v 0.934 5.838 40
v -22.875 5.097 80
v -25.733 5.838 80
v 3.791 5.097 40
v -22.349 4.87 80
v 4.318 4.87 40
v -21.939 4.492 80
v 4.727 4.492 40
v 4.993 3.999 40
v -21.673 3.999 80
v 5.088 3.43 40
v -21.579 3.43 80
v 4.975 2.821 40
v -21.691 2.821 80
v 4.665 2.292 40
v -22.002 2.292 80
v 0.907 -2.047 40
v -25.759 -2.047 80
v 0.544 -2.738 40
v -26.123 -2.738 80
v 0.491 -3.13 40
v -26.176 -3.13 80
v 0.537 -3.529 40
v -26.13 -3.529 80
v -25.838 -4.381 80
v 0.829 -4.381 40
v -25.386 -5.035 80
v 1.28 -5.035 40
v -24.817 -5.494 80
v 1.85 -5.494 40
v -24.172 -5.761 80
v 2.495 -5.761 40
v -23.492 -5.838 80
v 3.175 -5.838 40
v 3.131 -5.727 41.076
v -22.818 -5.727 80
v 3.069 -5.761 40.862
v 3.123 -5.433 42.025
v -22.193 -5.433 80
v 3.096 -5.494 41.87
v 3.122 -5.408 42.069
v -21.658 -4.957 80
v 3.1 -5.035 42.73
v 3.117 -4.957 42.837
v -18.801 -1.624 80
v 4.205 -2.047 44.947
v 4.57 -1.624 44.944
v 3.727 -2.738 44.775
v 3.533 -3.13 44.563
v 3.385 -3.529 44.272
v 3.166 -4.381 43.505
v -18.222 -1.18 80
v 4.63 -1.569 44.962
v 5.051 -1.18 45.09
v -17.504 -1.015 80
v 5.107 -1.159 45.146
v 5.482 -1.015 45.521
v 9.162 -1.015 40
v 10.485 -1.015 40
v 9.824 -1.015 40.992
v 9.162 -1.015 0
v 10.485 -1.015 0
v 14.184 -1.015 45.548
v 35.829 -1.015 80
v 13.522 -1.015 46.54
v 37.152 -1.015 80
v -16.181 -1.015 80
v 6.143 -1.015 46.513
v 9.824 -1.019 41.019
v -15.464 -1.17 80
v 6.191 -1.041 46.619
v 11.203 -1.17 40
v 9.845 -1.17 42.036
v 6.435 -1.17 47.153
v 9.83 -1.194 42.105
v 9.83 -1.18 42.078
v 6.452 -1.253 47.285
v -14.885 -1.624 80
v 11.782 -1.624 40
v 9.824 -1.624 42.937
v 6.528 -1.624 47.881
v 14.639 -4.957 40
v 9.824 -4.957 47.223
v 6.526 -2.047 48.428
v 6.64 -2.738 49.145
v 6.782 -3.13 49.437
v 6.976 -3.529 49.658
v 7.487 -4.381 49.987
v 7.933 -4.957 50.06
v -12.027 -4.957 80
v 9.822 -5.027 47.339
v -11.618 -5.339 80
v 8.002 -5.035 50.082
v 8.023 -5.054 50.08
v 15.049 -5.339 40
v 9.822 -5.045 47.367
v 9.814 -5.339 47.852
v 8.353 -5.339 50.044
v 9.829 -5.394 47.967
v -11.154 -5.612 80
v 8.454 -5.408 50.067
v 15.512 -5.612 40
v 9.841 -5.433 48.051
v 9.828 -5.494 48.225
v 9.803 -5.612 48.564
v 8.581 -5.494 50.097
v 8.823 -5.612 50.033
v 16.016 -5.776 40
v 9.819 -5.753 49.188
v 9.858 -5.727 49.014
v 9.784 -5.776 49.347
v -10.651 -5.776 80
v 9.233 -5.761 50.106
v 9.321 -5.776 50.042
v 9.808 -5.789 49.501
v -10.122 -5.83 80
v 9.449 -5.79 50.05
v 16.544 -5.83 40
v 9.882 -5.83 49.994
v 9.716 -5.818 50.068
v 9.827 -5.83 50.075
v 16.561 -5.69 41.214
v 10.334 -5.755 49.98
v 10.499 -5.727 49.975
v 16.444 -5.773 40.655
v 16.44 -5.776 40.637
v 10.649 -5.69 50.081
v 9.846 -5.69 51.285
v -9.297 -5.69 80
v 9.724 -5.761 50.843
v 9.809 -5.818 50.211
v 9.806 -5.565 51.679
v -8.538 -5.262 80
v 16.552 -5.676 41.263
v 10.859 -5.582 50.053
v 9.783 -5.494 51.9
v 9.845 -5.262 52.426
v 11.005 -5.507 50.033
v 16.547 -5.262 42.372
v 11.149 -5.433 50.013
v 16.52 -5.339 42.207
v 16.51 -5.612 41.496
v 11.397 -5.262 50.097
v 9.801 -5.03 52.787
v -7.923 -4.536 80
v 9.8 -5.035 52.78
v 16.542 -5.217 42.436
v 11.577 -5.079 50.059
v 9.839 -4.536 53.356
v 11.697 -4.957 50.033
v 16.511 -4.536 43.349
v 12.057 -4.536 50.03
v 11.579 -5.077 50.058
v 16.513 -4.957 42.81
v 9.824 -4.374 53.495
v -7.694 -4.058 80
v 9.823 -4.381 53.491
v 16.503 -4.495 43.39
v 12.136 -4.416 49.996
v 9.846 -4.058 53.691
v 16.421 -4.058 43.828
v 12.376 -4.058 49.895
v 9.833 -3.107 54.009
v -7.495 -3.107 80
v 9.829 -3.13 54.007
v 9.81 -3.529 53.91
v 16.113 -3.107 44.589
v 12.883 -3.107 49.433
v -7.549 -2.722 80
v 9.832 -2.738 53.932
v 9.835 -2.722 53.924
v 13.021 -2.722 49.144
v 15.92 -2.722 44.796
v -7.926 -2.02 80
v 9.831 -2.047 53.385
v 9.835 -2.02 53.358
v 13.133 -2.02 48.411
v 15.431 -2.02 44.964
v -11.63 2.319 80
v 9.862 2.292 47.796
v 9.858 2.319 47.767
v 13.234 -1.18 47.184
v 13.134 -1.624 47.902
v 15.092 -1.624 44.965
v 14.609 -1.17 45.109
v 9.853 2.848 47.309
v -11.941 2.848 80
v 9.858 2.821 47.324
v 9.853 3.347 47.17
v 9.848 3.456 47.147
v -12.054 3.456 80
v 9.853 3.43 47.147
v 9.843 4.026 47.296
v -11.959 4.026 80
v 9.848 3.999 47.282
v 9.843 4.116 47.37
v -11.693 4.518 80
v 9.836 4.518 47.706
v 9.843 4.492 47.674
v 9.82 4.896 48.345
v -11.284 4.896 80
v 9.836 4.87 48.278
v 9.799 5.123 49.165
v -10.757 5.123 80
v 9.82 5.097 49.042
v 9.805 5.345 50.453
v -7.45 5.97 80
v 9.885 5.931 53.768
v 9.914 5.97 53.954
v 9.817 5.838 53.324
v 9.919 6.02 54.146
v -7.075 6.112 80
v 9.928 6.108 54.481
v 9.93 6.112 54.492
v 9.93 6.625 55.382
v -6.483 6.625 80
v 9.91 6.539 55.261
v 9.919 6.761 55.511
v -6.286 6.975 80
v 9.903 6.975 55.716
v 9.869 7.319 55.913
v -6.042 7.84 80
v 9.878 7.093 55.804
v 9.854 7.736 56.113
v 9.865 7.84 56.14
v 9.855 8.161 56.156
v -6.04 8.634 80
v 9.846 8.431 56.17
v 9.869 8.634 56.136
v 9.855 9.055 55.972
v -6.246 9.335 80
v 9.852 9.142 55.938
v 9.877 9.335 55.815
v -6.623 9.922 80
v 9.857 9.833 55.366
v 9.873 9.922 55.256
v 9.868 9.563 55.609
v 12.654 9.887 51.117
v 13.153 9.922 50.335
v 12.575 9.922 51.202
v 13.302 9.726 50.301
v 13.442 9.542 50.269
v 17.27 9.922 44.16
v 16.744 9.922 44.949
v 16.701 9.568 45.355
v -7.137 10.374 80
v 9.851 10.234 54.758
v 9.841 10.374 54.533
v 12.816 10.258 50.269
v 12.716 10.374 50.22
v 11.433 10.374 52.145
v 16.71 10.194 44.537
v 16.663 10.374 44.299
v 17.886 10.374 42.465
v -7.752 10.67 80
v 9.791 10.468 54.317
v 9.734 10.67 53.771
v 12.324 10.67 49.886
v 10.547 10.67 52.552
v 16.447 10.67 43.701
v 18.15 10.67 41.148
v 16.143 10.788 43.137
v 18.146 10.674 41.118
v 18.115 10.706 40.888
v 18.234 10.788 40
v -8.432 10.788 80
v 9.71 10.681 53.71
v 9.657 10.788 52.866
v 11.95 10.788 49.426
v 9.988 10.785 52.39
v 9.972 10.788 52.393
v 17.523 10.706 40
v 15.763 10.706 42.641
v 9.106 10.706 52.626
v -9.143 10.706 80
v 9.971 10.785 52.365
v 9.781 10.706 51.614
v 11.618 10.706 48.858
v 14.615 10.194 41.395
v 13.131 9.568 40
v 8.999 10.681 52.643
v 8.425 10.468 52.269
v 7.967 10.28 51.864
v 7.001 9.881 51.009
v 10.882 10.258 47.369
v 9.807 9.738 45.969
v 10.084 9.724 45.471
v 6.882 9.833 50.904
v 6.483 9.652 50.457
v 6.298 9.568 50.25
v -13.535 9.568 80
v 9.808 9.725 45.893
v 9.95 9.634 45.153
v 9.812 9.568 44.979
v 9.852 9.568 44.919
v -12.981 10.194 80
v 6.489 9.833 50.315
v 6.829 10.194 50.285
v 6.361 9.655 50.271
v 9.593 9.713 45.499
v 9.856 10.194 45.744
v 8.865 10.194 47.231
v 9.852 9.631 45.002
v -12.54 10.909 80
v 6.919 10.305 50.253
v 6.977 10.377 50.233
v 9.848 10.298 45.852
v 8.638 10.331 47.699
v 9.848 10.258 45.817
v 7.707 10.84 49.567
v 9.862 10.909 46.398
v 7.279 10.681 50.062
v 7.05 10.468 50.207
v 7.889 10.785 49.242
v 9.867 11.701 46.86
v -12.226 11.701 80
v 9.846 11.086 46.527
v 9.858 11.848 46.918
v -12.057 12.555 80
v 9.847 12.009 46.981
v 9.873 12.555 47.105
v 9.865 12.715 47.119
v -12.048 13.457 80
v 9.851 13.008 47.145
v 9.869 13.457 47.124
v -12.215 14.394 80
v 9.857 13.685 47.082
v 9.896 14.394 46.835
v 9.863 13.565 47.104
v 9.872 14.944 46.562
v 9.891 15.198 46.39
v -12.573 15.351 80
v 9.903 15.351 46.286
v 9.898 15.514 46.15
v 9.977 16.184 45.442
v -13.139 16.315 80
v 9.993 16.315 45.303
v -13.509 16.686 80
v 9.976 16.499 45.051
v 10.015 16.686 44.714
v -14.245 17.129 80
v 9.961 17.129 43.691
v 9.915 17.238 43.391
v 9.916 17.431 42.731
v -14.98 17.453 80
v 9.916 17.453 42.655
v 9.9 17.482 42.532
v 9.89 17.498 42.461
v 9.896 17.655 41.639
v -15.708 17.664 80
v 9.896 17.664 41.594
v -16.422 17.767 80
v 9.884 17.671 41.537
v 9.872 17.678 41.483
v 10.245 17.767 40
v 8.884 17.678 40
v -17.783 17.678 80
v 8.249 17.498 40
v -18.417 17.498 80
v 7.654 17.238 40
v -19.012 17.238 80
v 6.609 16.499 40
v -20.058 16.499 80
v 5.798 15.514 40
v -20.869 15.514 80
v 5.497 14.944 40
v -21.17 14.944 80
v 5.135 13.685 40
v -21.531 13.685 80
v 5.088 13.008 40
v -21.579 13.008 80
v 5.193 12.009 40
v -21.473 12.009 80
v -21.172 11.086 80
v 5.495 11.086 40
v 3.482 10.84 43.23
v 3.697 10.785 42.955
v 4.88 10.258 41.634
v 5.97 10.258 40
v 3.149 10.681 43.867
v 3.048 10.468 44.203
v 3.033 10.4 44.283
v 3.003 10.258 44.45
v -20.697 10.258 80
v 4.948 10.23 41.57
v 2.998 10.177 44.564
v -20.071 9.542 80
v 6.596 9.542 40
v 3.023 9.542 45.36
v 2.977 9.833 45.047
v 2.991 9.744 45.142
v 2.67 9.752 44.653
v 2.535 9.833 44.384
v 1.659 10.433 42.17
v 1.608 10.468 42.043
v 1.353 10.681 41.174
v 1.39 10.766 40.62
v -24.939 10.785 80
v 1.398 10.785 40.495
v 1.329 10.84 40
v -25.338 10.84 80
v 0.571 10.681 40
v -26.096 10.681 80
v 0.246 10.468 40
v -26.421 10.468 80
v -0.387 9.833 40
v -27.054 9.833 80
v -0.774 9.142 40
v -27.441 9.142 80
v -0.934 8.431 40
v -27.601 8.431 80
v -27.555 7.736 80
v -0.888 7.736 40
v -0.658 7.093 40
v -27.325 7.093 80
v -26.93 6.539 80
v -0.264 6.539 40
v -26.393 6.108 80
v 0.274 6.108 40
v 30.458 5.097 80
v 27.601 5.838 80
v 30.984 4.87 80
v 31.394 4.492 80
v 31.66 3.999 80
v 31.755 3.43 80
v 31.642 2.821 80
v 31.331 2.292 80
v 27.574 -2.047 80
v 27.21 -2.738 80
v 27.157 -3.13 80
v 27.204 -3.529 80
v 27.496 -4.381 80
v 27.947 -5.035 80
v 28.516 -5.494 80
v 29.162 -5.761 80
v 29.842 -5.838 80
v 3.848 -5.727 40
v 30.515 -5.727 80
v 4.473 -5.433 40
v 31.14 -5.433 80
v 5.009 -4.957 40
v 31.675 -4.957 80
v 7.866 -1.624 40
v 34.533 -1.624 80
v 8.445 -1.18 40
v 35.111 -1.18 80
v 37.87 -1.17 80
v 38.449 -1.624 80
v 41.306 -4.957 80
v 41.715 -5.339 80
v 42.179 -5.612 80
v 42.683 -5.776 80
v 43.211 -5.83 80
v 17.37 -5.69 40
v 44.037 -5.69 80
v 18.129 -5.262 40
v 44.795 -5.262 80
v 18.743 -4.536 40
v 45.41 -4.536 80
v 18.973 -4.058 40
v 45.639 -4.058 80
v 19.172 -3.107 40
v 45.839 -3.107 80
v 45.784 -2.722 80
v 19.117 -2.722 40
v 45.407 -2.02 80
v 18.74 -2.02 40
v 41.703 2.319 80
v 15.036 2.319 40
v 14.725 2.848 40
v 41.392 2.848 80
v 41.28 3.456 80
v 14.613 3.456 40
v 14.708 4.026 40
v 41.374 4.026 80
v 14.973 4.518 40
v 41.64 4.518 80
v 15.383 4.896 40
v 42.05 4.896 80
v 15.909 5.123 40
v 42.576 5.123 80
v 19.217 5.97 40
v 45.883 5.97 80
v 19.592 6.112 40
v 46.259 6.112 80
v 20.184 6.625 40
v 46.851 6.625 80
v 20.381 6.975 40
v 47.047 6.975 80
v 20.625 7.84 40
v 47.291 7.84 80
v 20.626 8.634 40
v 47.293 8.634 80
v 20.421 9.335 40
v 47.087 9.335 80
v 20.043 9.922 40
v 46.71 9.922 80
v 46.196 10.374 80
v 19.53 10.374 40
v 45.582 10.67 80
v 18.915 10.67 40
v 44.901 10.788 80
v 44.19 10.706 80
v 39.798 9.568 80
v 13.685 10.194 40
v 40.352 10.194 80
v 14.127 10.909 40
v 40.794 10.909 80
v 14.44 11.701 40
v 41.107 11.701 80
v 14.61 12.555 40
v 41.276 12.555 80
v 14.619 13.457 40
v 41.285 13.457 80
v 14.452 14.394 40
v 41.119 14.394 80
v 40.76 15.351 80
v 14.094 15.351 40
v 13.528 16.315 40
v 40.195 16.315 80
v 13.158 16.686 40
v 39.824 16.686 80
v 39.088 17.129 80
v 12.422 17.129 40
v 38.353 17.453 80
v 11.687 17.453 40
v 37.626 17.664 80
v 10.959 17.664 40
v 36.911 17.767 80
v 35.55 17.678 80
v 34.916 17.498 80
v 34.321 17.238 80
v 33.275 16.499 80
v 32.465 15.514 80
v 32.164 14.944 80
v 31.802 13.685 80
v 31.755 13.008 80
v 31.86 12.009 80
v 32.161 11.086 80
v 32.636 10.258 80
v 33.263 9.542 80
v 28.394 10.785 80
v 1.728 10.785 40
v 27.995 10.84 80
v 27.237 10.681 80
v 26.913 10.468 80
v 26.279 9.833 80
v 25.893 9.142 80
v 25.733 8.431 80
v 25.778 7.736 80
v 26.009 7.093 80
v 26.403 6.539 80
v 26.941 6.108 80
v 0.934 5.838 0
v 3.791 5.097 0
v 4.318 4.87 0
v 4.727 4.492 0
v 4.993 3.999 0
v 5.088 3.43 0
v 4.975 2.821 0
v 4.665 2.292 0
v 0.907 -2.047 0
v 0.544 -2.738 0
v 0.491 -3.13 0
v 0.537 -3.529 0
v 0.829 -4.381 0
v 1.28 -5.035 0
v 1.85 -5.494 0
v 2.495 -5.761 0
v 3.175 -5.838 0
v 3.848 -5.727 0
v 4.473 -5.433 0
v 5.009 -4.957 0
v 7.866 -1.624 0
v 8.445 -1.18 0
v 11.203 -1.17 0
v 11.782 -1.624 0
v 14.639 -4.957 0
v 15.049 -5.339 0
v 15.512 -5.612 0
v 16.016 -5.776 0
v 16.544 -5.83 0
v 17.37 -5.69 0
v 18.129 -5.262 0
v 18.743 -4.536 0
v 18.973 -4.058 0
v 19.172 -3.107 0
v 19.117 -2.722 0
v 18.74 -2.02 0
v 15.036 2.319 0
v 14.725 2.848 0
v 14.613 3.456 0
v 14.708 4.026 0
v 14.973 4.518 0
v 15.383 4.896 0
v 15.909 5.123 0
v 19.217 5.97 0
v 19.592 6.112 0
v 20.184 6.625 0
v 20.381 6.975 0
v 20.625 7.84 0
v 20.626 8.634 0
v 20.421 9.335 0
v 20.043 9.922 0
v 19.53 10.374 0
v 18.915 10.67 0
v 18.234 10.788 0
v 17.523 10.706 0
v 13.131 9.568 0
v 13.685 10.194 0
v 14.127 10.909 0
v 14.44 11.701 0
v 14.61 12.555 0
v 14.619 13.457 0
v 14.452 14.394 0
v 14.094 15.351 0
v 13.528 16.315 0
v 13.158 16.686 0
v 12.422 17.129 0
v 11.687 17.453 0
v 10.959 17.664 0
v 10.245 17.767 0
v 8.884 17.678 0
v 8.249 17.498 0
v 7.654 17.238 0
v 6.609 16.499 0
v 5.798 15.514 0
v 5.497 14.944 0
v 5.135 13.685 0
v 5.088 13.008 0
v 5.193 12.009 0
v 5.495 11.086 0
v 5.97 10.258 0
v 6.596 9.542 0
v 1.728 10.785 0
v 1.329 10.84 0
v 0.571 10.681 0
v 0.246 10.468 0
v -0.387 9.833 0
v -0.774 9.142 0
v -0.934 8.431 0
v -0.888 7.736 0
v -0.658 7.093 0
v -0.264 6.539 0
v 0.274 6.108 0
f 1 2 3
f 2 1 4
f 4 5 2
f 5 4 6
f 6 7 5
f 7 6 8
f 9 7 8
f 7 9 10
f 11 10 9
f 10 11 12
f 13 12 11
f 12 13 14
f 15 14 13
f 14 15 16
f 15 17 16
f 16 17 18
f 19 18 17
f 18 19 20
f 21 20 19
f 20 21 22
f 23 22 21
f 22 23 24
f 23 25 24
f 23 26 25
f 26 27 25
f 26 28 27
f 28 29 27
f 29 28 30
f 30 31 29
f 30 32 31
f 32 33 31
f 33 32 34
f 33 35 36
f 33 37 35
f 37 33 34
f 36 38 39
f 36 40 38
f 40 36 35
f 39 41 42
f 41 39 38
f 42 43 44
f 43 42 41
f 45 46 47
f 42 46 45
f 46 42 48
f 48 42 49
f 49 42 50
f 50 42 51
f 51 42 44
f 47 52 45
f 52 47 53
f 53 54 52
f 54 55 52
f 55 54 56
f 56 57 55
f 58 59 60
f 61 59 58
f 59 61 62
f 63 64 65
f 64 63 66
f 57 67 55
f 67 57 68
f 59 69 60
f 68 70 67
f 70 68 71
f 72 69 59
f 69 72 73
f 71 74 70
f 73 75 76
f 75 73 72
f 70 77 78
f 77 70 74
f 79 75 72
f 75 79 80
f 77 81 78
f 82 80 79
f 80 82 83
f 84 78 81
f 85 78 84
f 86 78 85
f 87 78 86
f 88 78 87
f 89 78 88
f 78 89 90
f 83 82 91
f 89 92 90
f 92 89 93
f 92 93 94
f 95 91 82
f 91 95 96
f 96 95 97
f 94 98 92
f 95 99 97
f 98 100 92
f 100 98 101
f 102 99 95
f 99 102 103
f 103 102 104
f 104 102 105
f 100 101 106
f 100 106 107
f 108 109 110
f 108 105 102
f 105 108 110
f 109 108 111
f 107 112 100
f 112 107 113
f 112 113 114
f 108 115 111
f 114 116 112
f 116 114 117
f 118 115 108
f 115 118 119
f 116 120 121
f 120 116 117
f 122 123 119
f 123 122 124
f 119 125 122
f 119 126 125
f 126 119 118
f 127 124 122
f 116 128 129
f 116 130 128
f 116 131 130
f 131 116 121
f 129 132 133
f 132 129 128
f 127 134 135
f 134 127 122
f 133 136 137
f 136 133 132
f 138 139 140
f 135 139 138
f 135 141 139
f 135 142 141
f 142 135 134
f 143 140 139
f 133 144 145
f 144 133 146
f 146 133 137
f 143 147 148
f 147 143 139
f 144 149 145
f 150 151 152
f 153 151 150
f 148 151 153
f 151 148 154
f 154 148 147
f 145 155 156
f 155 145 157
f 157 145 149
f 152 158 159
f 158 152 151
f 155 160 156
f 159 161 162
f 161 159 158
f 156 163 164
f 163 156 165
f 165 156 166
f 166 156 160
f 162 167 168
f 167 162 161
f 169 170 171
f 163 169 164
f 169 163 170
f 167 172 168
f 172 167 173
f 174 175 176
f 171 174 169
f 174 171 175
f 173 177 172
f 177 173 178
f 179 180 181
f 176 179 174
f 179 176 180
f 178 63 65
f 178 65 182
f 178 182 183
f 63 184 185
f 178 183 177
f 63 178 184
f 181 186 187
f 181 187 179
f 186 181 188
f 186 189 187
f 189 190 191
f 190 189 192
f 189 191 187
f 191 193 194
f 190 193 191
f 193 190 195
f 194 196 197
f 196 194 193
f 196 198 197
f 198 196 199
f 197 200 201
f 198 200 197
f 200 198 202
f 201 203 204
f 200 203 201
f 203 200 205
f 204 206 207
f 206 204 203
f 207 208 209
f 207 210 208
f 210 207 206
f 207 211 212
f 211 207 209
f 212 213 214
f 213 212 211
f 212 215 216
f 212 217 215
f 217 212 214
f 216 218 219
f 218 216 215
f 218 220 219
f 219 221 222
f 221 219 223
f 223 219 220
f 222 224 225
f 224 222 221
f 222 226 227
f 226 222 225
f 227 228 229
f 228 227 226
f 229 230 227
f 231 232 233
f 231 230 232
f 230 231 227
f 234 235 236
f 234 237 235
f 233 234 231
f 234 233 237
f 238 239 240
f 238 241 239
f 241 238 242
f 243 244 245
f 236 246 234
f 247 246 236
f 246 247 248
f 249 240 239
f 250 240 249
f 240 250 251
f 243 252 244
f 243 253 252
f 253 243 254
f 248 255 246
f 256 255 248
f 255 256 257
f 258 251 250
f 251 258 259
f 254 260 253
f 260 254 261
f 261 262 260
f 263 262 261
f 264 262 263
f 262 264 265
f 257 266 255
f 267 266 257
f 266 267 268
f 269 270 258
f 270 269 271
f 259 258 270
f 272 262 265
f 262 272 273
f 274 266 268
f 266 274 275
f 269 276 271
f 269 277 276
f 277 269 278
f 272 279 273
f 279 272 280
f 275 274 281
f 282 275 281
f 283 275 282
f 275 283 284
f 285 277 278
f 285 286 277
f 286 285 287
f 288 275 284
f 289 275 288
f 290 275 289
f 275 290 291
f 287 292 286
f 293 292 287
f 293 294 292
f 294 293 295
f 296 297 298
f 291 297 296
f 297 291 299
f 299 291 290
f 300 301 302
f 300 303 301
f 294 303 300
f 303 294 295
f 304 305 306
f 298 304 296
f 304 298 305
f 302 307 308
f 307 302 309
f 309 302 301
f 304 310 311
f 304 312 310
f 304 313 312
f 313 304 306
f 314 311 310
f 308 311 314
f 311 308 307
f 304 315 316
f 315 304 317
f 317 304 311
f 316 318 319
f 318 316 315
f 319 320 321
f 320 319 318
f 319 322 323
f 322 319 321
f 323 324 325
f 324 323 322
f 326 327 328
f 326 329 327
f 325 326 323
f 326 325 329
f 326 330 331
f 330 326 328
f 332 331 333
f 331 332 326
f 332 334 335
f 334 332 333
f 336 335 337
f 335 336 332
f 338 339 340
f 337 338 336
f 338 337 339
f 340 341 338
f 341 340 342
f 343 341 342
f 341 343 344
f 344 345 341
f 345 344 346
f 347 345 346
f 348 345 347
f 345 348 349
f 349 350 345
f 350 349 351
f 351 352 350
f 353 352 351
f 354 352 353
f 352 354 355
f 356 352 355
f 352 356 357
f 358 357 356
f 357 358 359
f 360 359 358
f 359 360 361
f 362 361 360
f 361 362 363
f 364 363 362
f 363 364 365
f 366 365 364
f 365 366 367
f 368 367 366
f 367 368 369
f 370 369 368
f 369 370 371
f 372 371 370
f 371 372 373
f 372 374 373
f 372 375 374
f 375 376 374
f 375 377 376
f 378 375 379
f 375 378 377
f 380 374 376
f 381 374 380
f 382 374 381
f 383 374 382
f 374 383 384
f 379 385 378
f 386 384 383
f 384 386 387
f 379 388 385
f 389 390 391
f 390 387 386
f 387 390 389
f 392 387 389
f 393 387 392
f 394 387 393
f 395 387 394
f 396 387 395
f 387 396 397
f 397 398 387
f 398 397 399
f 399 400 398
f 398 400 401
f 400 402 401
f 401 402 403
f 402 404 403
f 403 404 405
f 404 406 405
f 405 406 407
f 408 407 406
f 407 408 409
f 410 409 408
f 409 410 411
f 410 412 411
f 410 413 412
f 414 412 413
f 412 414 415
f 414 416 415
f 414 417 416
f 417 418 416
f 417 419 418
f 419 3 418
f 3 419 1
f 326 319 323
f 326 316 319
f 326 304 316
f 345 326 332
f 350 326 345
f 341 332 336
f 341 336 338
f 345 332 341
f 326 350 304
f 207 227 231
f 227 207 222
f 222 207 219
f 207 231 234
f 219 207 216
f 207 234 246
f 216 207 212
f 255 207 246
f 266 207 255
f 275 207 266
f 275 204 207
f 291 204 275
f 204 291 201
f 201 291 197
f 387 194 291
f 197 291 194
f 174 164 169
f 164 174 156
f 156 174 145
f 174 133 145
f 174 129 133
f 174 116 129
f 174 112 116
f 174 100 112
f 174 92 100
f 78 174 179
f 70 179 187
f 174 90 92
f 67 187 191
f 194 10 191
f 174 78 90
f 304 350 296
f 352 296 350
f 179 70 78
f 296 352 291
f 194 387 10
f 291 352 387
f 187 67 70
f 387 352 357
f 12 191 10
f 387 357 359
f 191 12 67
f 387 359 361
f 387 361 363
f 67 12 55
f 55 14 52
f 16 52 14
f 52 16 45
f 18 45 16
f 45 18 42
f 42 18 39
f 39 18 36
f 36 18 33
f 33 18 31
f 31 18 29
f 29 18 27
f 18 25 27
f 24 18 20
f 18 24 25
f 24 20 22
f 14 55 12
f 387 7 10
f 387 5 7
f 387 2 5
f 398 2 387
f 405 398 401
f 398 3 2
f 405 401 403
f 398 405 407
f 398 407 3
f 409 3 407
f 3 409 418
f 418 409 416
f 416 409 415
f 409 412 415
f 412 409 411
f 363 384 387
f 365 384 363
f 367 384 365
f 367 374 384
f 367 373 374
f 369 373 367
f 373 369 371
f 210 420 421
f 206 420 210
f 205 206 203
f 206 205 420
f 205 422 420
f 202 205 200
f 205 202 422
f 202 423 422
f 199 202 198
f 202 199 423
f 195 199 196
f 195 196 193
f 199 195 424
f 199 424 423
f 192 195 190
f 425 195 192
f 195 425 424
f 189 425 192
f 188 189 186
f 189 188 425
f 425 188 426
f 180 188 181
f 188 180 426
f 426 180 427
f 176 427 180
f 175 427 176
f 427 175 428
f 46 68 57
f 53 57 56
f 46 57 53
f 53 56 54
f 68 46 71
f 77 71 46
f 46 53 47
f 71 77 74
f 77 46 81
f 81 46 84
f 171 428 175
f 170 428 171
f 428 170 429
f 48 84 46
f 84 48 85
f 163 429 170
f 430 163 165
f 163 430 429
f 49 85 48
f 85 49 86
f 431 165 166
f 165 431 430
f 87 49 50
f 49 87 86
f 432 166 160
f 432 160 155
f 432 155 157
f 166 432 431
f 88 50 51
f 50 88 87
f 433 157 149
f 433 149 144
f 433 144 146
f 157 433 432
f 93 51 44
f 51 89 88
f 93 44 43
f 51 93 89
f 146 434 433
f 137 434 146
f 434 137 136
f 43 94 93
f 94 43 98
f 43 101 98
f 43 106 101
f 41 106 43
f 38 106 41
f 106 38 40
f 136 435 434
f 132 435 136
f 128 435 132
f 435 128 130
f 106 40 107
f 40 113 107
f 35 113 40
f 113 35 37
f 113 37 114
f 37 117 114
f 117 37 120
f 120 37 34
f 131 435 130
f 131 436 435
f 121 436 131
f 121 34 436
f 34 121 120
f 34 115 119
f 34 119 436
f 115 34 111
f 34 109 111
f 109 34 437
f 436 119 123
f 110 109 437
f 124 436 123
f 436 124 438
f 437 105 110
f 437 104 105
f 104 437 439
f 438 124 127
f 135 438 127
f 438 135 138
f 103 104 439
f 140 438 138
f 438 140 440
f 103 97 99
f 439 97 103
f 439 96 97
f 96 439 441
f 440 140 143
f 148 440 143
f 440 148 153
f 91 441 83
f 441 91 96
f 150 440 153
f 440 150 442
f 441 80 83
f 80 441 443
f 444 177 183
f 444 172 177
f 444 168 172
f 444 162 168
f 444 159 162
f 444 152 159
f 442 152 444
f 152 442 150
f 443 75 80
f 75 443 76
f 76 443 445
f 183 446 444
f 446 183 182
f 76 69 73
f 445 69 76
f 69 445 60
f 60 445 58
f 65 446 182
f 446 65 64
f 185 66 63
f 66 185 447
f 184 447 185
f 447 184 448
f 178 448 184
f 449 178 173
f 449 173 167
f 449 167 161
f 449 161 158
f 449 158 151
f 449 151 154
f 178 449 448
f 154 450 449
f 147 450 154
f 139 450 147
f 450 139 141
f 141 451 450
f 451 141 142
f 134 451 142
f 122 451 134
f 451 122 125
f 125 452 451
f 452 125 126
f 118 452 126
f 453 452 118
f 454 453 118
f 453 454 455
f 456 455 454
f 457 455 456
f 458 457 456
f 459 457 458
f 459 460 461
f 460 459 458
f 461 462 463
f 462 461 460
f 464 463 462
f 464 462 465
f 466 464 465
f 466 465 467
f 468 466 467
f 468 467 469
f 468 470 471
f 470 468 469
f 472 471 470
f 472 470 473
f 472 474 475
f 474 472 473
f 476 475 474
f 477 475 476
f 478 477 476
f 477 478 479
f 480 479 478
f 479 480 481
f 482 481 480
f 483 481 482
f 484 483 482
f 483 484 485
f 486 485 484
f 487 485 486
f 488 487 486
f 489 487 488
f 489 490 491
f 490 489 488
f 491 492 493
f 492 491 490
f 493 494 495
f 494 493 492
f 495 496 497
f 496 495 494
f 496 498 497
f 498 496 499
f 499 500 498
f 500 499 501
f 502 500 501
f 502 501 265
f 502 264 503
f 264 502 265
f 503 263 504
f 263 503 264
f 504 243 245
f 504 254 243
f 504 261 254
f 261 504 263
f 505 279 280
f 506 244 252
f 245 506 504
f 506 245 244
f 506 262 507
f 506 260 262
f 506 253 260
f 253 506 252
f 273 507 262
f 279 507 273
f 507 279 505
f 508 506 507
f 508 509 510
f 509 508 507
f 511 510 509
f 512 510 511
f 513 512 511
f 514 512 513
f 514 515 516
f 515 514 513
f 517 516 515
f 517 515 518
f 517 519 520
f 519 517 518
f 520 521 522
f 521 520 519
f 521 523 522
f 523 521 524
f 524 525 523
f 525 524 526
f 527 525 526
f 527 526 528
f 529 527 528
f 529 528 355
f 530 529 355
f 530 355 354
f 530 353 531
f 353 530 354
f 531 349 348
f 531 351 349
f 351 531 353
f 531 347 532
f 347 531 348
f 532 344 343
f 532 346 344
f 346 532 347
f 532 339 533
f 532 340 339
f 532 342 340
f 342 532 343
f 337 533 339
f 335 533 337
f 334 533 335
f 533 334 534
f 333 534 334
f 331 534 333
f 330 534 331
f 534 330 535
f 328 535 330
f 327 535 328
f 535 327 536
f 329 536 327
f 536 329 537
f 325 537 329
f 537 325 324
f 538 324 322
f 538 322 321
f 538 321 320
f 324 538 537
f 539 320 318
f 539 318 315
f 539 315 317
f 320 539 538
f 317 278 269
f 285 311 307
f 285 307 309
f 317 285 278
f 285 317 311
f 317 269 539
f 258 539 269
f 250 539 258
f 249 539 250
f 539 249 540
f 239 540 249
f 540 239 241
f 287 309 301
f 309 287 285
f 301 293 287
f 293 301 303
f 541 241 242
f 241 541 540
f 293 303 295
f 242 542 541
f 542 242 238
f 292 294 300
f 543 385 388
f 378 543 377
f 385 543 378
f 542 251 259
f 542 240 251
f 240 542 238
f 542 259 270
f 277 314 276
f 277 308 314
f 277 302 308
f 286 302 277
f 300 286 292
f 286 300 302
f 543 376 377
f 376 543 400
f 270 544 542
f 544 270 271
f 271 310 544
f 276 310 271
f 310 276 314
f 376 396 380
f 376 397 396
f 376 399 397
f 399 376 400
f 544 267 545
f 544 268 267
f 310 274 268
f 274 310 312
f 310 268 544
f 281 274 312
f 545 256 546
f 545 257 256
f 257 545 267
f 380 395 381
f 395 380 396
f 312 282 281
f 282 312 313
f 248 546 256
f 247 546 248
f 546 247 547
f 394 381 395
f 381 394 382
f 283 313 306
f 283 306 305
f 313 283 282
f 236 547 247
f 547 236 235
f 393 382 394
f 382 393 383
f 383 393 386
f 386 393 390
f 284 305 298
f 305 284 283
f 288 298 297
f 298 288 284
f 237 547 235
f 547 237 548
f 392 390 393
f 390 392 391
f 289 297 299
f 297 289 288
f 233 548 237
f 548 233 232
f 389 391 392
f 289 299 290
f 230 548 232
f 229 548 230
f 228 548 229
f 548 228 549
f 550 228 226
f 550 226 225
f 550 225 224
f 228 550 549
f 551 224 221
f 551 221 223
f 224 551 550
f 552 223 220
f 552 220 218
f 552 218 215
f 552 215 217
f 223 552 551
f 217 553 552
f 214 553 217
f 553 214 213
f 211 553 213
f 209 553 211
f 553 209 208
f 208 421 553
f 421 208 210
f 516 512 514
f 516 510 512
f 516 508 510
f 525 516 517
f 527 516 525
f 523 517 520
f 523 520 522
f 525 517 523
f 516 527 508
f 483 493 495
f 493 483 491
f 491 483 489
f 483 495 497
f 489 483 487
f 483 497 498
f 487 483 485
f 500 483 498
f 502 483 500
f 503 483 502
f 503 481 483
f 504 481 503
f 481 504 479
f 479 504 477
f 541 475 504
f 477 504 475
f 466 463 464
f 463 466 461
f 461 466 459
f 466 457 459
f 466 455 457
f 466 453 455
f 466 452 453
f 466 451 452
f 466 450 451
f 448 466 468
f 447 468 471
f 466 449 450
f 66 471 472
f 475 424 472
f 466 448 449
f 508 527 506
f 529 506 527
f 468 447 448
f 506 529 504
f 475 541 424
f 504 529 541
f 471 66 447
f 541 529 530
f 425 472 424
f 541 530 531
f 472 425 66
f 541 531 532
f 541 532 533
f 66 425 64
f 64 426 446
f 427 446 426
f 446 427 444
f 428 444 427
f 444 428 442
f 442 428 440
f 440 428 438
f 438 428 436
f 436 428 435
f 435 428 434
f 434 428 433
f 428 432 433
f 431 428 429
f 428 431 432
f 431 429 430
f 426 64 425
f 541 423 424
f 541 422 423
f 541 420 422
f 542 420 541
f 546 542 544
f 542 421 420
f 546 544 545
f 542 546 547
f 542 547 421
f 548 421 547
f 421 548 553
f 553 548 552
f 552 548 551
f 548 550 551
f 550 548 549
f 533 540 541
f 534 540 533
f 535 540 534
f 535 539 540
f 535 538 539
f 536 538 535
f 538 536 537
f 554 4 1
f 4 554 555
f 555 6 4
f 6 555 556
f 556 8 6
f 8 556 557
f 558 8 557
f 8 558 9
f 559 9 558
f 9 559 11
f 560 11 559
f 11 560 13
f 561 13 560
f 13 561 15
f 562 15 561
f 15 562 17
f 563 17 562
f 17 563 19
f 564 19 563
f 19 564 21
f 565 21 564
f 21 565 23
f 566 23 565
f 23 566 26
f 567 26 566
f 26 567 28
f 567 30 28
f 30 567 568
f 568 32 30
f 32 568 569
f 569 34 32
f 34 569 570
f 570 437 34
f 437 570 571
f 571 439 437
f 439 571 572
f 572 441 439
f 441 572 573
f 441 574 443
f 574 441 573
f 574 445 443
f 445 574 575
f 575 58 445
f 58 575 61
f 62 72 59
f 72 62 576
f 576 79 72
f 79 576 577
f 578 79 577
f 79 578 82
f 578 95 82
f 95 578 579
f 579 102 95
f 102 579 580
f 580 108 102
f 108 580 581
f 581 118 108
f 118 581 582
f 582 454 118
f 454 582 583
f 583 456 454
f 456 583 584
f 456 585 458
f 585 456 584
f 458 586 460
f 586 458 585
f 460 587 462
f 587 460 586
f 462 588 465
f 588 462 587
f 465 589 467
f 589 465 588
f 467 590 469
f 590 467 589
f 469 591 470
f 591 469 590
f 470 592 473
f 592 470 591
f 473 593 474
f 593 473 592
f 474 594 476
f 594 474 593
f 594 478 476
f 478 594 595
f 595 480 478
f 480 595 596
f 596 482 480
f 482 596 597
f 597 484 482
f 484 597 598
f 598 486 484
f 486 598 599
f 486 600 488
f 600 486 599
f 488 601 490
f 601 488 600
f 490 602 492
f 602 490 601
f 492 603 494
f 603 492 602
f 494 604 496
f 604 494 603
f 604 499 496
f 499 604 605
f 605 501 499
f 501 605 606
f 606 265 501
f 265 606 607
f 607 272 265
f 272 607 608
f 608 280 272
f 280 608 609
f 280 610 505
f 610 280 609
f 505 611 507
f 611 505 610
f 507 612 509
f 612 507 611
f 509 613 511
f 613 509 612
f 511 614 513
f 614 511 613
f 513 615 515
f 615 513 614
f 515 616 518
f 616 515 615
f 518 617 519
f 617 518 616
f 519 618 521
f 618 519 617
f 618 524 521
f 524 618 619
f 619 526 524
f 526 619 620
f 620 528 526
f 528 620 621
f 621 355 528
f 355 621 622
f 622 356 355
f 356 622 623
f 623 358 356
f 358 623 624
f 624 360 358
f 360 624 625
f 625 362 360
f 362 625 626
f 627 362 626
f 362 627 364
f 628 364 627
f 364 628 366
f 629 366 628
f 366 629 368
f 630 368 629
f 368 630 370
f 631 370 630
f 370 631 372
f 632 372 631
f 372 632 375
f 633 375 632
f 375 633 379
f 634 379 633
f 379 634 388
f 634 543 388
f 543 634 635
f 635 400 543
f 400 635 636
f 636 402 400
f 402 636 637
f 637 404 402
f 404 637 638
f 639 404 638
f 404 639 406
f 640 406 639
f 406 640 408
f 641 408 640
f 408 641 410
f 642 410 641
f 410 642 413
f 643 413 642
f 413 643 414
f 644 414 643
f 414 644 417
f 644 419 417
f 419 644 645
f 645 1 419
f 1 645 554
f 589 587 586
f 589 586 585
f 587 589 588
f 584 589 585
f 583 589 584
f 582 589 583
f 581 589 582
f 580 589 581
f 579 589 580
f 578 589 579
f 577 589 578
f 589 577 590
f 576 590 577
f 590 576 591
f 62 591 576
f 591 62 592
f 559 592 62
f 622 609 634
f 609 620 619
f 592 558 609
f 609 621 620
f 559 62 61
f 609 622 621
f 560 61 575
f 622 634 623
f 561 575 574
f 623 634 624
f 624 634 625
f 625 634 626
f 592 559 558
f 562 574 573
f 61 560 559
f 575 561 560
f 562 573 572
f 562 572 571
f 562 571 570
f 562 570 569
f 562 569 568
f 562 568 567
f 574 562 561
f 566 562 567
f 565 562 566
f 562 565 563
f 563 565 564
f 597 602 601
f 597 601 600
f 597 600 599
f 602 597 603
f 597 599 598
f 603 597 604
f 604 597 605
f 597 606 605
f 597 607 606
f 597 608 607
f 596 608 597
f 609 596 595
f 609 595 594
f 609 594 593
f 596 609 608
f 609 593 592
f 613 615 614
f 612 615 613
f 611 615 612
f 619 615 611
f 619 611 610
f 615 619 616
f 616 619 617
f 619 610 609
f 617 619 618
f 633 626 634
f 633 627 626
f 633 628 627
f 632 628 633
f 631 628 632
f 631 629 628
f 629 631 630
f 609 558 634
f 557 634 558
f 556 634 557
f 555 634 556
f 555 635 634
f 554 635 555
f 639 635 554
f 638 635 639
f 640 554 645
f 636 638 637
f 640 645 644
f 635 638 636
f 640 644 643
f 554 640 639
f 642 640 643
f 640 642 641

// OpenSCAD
use <tubemesh.scad>;


//
// gingerbread man by mikicon under cc-by-3.0 license:
// https://thenounproject.com/search/?q=gingerbread&i=704662
// 

center_ginger_1 = [-9.850380656,-2.662705688];
size_ginger_1 = [1.867844645,11.675411377];
color_ginger_1 = [0.00000,0.00000,0.00000];
// paths for ginger_1
points_ginger_1_1 = [ [0.933922323,5.837705688],[3.791422323,5.096872355],[4.317695109,4.869909465],[4.727385864,4.491637980],[4.993209432,3.999264933],[5.087880656,3.429997355],[4.975432739,2.821455688],[4.664547323,2.292289022],[0.907463989,-2.046877645],[0.543661906,-2.738101603],[0.490745239,-3.129602254],[0.537047323,-3.528544312],[0.829019165,-4.381050415],[1.280361125,-5.035429077],[1.849525350,-5.494470825],[2.494963989,-5.760966187],[3.175129191,-5.837705688],[3.848473104,-5.727479858],[4.473447876,-5.433079224],[5.008505656,-4.957294312],[7.866005656,-1.623544312],[8.444781698,-1.180367228],[9.162463989,-1.015002645],[10.485380656,-1.015002645],[11.203062948,-1.170445353],[11.781838989,-1.623544312],[14.639338989,-4.957294312],[15.048616333,-5.339286499],[15.512463989,-5.612138062],[16.015999146,-5.775848999],[16.544338989,-5.830419312],[17.369921672,-5.689859416],[18.128531698,-5.261565145],[18.743274536,-4.535614624],[18.972666219,-4.057917684],[19.171982218,-3.106864624],[19.117411906,-2.721565145],[18.740380656,-2.020419312],[15.036213989,2.318747355],[14.725328573,2.847914022],[14.612880656,3.456455688],[14.707551880,4.025723267],[14.973375448,4.518096313],[15.383066203,4.896367798],[15.909338989,5.123330688],[19.216630656,5.969997355],[19.592008260,6.112210897],[20.184013468,6.624841105],[20.380797323,6.975414022],[20.624813436,7.840012410],[20.626363729,8.633607381],[20.420794881,9.334804891],[20.043453573,9.922210897],[19.529686483,10.374431356],[18.914840291,10.670072225],[18.234261678,10.787739461],[17.523297323,10.706039022],[13.131213989,9.568330688],[13.685443726,10.193563843],[14.127122192,10.909024048],[14.440436401,11.700758667],[14.609573364,12.554815063],[14.618720093,13.457240601],[14.452063599,14.394082642],[14.093790894,15.351388550],[13.528088989,16.315205688],[13.157672323,16.685622355],[12.421735331,17.129464773],[11.686651001,17.453275757],[10.958853048,17.663527781],[10.244775187,17.766693319],[8.883514608,17.677654826],[8.249199320,17.498395742],[7.654338989,17.237940063],[6.608718058,16.499328817],[5.798121541,15.513600871],[5.497041728,14.944249318],[5.135487569,13.684933421],[5.087880656,13.007914022],[5.193300578,12.008698527],[5.494677531,11.086377563],[5.969687297,10.258314412],[6.596005656,9.541872355],[1.727672323,10.785414022],[1.328730265,10.839984334],[0.570533651,10.681234334],[0.246005656,10.467914022],[-0.387495728,9.832707316],[-0.773880412,9.141690063],[-0.933922323,8.430829061],[-0.888395386,7.736091105],[-0.658073527,7.093442993],[-0.263730672,6.538851522],[0.273859253,6.108283488],[0.933922323,5.837705688] ];

function translateSection(xyz, section) =
    [for (p=section) [ xyz[0]+p[0], xyz[1]+p[1], xyz[2]+(p[2]==undef?0:p[2]) ]];

module pipe(points, section) {
    sections = [for (p=points) translateSection(p, section) ];
    pAndF = pointsAndFaces(sections);
    polyhedron(points=pAndF[0], faces=pAndF[1]);
}

module person(includeBottom=true,includeTop=true,left=true,size=40,slicePosition=undef,sliceThickness=2,thicken=0,omitSlice=false) {
    points = includeBottom && includeTop ?
                [[0,0,0],[0,0,size],[left?-size/1.5:size/1.5,0,2*size]] :
             includeBottom ? [[0,0,0],[0,0,size]] :
             [[0,0,size],[left?-size/1.5:size/1.5,0,2*size]];
    render(convexity=3)
    if (slicePosition==undef) pipe(points, points_ginger_1_1);
    else if (omitSlice) {
        difference() {
            pipe(points,points_ginger_1_1);
            translate([-size-40,-size-40,slicePosition!=undef?slicePosition:0]) cube([size*2+80,size*2+80,sliceThickness]);            
        }
    }
    else {
        intersection() {
            pipe(points,points_ginger_1_1);
            translate([-size-40,-size-40,slicePosition!=undef?slicePosition:0]) cube([size*2+80,size*2+80,sliceThickness]);            
        }
    }
}

color([0.,0.,1.,0.65]) person(includeBottom=false,left=true,omitSlice=true,slicePosition=60);
color([0.,1.,0.,0.65]) person(includeBottom=false,left=false,omitSlice=true,slicePosition=60);
color([1.,0.,0.,0.65]) person(includeBottom=true,includeTop=false,omitSlice=true,slicePosition=20);


color([0.,0.,1.,1.]) person(includeBottom=false,left=true,slicePosition=60);
color([0.,1.,0.,1.]) person(includeBottom=false,left=false,slicePosition=60);
color([1.,0.,0.,1.0]) person(includeTop=false,slicePosition=20);
